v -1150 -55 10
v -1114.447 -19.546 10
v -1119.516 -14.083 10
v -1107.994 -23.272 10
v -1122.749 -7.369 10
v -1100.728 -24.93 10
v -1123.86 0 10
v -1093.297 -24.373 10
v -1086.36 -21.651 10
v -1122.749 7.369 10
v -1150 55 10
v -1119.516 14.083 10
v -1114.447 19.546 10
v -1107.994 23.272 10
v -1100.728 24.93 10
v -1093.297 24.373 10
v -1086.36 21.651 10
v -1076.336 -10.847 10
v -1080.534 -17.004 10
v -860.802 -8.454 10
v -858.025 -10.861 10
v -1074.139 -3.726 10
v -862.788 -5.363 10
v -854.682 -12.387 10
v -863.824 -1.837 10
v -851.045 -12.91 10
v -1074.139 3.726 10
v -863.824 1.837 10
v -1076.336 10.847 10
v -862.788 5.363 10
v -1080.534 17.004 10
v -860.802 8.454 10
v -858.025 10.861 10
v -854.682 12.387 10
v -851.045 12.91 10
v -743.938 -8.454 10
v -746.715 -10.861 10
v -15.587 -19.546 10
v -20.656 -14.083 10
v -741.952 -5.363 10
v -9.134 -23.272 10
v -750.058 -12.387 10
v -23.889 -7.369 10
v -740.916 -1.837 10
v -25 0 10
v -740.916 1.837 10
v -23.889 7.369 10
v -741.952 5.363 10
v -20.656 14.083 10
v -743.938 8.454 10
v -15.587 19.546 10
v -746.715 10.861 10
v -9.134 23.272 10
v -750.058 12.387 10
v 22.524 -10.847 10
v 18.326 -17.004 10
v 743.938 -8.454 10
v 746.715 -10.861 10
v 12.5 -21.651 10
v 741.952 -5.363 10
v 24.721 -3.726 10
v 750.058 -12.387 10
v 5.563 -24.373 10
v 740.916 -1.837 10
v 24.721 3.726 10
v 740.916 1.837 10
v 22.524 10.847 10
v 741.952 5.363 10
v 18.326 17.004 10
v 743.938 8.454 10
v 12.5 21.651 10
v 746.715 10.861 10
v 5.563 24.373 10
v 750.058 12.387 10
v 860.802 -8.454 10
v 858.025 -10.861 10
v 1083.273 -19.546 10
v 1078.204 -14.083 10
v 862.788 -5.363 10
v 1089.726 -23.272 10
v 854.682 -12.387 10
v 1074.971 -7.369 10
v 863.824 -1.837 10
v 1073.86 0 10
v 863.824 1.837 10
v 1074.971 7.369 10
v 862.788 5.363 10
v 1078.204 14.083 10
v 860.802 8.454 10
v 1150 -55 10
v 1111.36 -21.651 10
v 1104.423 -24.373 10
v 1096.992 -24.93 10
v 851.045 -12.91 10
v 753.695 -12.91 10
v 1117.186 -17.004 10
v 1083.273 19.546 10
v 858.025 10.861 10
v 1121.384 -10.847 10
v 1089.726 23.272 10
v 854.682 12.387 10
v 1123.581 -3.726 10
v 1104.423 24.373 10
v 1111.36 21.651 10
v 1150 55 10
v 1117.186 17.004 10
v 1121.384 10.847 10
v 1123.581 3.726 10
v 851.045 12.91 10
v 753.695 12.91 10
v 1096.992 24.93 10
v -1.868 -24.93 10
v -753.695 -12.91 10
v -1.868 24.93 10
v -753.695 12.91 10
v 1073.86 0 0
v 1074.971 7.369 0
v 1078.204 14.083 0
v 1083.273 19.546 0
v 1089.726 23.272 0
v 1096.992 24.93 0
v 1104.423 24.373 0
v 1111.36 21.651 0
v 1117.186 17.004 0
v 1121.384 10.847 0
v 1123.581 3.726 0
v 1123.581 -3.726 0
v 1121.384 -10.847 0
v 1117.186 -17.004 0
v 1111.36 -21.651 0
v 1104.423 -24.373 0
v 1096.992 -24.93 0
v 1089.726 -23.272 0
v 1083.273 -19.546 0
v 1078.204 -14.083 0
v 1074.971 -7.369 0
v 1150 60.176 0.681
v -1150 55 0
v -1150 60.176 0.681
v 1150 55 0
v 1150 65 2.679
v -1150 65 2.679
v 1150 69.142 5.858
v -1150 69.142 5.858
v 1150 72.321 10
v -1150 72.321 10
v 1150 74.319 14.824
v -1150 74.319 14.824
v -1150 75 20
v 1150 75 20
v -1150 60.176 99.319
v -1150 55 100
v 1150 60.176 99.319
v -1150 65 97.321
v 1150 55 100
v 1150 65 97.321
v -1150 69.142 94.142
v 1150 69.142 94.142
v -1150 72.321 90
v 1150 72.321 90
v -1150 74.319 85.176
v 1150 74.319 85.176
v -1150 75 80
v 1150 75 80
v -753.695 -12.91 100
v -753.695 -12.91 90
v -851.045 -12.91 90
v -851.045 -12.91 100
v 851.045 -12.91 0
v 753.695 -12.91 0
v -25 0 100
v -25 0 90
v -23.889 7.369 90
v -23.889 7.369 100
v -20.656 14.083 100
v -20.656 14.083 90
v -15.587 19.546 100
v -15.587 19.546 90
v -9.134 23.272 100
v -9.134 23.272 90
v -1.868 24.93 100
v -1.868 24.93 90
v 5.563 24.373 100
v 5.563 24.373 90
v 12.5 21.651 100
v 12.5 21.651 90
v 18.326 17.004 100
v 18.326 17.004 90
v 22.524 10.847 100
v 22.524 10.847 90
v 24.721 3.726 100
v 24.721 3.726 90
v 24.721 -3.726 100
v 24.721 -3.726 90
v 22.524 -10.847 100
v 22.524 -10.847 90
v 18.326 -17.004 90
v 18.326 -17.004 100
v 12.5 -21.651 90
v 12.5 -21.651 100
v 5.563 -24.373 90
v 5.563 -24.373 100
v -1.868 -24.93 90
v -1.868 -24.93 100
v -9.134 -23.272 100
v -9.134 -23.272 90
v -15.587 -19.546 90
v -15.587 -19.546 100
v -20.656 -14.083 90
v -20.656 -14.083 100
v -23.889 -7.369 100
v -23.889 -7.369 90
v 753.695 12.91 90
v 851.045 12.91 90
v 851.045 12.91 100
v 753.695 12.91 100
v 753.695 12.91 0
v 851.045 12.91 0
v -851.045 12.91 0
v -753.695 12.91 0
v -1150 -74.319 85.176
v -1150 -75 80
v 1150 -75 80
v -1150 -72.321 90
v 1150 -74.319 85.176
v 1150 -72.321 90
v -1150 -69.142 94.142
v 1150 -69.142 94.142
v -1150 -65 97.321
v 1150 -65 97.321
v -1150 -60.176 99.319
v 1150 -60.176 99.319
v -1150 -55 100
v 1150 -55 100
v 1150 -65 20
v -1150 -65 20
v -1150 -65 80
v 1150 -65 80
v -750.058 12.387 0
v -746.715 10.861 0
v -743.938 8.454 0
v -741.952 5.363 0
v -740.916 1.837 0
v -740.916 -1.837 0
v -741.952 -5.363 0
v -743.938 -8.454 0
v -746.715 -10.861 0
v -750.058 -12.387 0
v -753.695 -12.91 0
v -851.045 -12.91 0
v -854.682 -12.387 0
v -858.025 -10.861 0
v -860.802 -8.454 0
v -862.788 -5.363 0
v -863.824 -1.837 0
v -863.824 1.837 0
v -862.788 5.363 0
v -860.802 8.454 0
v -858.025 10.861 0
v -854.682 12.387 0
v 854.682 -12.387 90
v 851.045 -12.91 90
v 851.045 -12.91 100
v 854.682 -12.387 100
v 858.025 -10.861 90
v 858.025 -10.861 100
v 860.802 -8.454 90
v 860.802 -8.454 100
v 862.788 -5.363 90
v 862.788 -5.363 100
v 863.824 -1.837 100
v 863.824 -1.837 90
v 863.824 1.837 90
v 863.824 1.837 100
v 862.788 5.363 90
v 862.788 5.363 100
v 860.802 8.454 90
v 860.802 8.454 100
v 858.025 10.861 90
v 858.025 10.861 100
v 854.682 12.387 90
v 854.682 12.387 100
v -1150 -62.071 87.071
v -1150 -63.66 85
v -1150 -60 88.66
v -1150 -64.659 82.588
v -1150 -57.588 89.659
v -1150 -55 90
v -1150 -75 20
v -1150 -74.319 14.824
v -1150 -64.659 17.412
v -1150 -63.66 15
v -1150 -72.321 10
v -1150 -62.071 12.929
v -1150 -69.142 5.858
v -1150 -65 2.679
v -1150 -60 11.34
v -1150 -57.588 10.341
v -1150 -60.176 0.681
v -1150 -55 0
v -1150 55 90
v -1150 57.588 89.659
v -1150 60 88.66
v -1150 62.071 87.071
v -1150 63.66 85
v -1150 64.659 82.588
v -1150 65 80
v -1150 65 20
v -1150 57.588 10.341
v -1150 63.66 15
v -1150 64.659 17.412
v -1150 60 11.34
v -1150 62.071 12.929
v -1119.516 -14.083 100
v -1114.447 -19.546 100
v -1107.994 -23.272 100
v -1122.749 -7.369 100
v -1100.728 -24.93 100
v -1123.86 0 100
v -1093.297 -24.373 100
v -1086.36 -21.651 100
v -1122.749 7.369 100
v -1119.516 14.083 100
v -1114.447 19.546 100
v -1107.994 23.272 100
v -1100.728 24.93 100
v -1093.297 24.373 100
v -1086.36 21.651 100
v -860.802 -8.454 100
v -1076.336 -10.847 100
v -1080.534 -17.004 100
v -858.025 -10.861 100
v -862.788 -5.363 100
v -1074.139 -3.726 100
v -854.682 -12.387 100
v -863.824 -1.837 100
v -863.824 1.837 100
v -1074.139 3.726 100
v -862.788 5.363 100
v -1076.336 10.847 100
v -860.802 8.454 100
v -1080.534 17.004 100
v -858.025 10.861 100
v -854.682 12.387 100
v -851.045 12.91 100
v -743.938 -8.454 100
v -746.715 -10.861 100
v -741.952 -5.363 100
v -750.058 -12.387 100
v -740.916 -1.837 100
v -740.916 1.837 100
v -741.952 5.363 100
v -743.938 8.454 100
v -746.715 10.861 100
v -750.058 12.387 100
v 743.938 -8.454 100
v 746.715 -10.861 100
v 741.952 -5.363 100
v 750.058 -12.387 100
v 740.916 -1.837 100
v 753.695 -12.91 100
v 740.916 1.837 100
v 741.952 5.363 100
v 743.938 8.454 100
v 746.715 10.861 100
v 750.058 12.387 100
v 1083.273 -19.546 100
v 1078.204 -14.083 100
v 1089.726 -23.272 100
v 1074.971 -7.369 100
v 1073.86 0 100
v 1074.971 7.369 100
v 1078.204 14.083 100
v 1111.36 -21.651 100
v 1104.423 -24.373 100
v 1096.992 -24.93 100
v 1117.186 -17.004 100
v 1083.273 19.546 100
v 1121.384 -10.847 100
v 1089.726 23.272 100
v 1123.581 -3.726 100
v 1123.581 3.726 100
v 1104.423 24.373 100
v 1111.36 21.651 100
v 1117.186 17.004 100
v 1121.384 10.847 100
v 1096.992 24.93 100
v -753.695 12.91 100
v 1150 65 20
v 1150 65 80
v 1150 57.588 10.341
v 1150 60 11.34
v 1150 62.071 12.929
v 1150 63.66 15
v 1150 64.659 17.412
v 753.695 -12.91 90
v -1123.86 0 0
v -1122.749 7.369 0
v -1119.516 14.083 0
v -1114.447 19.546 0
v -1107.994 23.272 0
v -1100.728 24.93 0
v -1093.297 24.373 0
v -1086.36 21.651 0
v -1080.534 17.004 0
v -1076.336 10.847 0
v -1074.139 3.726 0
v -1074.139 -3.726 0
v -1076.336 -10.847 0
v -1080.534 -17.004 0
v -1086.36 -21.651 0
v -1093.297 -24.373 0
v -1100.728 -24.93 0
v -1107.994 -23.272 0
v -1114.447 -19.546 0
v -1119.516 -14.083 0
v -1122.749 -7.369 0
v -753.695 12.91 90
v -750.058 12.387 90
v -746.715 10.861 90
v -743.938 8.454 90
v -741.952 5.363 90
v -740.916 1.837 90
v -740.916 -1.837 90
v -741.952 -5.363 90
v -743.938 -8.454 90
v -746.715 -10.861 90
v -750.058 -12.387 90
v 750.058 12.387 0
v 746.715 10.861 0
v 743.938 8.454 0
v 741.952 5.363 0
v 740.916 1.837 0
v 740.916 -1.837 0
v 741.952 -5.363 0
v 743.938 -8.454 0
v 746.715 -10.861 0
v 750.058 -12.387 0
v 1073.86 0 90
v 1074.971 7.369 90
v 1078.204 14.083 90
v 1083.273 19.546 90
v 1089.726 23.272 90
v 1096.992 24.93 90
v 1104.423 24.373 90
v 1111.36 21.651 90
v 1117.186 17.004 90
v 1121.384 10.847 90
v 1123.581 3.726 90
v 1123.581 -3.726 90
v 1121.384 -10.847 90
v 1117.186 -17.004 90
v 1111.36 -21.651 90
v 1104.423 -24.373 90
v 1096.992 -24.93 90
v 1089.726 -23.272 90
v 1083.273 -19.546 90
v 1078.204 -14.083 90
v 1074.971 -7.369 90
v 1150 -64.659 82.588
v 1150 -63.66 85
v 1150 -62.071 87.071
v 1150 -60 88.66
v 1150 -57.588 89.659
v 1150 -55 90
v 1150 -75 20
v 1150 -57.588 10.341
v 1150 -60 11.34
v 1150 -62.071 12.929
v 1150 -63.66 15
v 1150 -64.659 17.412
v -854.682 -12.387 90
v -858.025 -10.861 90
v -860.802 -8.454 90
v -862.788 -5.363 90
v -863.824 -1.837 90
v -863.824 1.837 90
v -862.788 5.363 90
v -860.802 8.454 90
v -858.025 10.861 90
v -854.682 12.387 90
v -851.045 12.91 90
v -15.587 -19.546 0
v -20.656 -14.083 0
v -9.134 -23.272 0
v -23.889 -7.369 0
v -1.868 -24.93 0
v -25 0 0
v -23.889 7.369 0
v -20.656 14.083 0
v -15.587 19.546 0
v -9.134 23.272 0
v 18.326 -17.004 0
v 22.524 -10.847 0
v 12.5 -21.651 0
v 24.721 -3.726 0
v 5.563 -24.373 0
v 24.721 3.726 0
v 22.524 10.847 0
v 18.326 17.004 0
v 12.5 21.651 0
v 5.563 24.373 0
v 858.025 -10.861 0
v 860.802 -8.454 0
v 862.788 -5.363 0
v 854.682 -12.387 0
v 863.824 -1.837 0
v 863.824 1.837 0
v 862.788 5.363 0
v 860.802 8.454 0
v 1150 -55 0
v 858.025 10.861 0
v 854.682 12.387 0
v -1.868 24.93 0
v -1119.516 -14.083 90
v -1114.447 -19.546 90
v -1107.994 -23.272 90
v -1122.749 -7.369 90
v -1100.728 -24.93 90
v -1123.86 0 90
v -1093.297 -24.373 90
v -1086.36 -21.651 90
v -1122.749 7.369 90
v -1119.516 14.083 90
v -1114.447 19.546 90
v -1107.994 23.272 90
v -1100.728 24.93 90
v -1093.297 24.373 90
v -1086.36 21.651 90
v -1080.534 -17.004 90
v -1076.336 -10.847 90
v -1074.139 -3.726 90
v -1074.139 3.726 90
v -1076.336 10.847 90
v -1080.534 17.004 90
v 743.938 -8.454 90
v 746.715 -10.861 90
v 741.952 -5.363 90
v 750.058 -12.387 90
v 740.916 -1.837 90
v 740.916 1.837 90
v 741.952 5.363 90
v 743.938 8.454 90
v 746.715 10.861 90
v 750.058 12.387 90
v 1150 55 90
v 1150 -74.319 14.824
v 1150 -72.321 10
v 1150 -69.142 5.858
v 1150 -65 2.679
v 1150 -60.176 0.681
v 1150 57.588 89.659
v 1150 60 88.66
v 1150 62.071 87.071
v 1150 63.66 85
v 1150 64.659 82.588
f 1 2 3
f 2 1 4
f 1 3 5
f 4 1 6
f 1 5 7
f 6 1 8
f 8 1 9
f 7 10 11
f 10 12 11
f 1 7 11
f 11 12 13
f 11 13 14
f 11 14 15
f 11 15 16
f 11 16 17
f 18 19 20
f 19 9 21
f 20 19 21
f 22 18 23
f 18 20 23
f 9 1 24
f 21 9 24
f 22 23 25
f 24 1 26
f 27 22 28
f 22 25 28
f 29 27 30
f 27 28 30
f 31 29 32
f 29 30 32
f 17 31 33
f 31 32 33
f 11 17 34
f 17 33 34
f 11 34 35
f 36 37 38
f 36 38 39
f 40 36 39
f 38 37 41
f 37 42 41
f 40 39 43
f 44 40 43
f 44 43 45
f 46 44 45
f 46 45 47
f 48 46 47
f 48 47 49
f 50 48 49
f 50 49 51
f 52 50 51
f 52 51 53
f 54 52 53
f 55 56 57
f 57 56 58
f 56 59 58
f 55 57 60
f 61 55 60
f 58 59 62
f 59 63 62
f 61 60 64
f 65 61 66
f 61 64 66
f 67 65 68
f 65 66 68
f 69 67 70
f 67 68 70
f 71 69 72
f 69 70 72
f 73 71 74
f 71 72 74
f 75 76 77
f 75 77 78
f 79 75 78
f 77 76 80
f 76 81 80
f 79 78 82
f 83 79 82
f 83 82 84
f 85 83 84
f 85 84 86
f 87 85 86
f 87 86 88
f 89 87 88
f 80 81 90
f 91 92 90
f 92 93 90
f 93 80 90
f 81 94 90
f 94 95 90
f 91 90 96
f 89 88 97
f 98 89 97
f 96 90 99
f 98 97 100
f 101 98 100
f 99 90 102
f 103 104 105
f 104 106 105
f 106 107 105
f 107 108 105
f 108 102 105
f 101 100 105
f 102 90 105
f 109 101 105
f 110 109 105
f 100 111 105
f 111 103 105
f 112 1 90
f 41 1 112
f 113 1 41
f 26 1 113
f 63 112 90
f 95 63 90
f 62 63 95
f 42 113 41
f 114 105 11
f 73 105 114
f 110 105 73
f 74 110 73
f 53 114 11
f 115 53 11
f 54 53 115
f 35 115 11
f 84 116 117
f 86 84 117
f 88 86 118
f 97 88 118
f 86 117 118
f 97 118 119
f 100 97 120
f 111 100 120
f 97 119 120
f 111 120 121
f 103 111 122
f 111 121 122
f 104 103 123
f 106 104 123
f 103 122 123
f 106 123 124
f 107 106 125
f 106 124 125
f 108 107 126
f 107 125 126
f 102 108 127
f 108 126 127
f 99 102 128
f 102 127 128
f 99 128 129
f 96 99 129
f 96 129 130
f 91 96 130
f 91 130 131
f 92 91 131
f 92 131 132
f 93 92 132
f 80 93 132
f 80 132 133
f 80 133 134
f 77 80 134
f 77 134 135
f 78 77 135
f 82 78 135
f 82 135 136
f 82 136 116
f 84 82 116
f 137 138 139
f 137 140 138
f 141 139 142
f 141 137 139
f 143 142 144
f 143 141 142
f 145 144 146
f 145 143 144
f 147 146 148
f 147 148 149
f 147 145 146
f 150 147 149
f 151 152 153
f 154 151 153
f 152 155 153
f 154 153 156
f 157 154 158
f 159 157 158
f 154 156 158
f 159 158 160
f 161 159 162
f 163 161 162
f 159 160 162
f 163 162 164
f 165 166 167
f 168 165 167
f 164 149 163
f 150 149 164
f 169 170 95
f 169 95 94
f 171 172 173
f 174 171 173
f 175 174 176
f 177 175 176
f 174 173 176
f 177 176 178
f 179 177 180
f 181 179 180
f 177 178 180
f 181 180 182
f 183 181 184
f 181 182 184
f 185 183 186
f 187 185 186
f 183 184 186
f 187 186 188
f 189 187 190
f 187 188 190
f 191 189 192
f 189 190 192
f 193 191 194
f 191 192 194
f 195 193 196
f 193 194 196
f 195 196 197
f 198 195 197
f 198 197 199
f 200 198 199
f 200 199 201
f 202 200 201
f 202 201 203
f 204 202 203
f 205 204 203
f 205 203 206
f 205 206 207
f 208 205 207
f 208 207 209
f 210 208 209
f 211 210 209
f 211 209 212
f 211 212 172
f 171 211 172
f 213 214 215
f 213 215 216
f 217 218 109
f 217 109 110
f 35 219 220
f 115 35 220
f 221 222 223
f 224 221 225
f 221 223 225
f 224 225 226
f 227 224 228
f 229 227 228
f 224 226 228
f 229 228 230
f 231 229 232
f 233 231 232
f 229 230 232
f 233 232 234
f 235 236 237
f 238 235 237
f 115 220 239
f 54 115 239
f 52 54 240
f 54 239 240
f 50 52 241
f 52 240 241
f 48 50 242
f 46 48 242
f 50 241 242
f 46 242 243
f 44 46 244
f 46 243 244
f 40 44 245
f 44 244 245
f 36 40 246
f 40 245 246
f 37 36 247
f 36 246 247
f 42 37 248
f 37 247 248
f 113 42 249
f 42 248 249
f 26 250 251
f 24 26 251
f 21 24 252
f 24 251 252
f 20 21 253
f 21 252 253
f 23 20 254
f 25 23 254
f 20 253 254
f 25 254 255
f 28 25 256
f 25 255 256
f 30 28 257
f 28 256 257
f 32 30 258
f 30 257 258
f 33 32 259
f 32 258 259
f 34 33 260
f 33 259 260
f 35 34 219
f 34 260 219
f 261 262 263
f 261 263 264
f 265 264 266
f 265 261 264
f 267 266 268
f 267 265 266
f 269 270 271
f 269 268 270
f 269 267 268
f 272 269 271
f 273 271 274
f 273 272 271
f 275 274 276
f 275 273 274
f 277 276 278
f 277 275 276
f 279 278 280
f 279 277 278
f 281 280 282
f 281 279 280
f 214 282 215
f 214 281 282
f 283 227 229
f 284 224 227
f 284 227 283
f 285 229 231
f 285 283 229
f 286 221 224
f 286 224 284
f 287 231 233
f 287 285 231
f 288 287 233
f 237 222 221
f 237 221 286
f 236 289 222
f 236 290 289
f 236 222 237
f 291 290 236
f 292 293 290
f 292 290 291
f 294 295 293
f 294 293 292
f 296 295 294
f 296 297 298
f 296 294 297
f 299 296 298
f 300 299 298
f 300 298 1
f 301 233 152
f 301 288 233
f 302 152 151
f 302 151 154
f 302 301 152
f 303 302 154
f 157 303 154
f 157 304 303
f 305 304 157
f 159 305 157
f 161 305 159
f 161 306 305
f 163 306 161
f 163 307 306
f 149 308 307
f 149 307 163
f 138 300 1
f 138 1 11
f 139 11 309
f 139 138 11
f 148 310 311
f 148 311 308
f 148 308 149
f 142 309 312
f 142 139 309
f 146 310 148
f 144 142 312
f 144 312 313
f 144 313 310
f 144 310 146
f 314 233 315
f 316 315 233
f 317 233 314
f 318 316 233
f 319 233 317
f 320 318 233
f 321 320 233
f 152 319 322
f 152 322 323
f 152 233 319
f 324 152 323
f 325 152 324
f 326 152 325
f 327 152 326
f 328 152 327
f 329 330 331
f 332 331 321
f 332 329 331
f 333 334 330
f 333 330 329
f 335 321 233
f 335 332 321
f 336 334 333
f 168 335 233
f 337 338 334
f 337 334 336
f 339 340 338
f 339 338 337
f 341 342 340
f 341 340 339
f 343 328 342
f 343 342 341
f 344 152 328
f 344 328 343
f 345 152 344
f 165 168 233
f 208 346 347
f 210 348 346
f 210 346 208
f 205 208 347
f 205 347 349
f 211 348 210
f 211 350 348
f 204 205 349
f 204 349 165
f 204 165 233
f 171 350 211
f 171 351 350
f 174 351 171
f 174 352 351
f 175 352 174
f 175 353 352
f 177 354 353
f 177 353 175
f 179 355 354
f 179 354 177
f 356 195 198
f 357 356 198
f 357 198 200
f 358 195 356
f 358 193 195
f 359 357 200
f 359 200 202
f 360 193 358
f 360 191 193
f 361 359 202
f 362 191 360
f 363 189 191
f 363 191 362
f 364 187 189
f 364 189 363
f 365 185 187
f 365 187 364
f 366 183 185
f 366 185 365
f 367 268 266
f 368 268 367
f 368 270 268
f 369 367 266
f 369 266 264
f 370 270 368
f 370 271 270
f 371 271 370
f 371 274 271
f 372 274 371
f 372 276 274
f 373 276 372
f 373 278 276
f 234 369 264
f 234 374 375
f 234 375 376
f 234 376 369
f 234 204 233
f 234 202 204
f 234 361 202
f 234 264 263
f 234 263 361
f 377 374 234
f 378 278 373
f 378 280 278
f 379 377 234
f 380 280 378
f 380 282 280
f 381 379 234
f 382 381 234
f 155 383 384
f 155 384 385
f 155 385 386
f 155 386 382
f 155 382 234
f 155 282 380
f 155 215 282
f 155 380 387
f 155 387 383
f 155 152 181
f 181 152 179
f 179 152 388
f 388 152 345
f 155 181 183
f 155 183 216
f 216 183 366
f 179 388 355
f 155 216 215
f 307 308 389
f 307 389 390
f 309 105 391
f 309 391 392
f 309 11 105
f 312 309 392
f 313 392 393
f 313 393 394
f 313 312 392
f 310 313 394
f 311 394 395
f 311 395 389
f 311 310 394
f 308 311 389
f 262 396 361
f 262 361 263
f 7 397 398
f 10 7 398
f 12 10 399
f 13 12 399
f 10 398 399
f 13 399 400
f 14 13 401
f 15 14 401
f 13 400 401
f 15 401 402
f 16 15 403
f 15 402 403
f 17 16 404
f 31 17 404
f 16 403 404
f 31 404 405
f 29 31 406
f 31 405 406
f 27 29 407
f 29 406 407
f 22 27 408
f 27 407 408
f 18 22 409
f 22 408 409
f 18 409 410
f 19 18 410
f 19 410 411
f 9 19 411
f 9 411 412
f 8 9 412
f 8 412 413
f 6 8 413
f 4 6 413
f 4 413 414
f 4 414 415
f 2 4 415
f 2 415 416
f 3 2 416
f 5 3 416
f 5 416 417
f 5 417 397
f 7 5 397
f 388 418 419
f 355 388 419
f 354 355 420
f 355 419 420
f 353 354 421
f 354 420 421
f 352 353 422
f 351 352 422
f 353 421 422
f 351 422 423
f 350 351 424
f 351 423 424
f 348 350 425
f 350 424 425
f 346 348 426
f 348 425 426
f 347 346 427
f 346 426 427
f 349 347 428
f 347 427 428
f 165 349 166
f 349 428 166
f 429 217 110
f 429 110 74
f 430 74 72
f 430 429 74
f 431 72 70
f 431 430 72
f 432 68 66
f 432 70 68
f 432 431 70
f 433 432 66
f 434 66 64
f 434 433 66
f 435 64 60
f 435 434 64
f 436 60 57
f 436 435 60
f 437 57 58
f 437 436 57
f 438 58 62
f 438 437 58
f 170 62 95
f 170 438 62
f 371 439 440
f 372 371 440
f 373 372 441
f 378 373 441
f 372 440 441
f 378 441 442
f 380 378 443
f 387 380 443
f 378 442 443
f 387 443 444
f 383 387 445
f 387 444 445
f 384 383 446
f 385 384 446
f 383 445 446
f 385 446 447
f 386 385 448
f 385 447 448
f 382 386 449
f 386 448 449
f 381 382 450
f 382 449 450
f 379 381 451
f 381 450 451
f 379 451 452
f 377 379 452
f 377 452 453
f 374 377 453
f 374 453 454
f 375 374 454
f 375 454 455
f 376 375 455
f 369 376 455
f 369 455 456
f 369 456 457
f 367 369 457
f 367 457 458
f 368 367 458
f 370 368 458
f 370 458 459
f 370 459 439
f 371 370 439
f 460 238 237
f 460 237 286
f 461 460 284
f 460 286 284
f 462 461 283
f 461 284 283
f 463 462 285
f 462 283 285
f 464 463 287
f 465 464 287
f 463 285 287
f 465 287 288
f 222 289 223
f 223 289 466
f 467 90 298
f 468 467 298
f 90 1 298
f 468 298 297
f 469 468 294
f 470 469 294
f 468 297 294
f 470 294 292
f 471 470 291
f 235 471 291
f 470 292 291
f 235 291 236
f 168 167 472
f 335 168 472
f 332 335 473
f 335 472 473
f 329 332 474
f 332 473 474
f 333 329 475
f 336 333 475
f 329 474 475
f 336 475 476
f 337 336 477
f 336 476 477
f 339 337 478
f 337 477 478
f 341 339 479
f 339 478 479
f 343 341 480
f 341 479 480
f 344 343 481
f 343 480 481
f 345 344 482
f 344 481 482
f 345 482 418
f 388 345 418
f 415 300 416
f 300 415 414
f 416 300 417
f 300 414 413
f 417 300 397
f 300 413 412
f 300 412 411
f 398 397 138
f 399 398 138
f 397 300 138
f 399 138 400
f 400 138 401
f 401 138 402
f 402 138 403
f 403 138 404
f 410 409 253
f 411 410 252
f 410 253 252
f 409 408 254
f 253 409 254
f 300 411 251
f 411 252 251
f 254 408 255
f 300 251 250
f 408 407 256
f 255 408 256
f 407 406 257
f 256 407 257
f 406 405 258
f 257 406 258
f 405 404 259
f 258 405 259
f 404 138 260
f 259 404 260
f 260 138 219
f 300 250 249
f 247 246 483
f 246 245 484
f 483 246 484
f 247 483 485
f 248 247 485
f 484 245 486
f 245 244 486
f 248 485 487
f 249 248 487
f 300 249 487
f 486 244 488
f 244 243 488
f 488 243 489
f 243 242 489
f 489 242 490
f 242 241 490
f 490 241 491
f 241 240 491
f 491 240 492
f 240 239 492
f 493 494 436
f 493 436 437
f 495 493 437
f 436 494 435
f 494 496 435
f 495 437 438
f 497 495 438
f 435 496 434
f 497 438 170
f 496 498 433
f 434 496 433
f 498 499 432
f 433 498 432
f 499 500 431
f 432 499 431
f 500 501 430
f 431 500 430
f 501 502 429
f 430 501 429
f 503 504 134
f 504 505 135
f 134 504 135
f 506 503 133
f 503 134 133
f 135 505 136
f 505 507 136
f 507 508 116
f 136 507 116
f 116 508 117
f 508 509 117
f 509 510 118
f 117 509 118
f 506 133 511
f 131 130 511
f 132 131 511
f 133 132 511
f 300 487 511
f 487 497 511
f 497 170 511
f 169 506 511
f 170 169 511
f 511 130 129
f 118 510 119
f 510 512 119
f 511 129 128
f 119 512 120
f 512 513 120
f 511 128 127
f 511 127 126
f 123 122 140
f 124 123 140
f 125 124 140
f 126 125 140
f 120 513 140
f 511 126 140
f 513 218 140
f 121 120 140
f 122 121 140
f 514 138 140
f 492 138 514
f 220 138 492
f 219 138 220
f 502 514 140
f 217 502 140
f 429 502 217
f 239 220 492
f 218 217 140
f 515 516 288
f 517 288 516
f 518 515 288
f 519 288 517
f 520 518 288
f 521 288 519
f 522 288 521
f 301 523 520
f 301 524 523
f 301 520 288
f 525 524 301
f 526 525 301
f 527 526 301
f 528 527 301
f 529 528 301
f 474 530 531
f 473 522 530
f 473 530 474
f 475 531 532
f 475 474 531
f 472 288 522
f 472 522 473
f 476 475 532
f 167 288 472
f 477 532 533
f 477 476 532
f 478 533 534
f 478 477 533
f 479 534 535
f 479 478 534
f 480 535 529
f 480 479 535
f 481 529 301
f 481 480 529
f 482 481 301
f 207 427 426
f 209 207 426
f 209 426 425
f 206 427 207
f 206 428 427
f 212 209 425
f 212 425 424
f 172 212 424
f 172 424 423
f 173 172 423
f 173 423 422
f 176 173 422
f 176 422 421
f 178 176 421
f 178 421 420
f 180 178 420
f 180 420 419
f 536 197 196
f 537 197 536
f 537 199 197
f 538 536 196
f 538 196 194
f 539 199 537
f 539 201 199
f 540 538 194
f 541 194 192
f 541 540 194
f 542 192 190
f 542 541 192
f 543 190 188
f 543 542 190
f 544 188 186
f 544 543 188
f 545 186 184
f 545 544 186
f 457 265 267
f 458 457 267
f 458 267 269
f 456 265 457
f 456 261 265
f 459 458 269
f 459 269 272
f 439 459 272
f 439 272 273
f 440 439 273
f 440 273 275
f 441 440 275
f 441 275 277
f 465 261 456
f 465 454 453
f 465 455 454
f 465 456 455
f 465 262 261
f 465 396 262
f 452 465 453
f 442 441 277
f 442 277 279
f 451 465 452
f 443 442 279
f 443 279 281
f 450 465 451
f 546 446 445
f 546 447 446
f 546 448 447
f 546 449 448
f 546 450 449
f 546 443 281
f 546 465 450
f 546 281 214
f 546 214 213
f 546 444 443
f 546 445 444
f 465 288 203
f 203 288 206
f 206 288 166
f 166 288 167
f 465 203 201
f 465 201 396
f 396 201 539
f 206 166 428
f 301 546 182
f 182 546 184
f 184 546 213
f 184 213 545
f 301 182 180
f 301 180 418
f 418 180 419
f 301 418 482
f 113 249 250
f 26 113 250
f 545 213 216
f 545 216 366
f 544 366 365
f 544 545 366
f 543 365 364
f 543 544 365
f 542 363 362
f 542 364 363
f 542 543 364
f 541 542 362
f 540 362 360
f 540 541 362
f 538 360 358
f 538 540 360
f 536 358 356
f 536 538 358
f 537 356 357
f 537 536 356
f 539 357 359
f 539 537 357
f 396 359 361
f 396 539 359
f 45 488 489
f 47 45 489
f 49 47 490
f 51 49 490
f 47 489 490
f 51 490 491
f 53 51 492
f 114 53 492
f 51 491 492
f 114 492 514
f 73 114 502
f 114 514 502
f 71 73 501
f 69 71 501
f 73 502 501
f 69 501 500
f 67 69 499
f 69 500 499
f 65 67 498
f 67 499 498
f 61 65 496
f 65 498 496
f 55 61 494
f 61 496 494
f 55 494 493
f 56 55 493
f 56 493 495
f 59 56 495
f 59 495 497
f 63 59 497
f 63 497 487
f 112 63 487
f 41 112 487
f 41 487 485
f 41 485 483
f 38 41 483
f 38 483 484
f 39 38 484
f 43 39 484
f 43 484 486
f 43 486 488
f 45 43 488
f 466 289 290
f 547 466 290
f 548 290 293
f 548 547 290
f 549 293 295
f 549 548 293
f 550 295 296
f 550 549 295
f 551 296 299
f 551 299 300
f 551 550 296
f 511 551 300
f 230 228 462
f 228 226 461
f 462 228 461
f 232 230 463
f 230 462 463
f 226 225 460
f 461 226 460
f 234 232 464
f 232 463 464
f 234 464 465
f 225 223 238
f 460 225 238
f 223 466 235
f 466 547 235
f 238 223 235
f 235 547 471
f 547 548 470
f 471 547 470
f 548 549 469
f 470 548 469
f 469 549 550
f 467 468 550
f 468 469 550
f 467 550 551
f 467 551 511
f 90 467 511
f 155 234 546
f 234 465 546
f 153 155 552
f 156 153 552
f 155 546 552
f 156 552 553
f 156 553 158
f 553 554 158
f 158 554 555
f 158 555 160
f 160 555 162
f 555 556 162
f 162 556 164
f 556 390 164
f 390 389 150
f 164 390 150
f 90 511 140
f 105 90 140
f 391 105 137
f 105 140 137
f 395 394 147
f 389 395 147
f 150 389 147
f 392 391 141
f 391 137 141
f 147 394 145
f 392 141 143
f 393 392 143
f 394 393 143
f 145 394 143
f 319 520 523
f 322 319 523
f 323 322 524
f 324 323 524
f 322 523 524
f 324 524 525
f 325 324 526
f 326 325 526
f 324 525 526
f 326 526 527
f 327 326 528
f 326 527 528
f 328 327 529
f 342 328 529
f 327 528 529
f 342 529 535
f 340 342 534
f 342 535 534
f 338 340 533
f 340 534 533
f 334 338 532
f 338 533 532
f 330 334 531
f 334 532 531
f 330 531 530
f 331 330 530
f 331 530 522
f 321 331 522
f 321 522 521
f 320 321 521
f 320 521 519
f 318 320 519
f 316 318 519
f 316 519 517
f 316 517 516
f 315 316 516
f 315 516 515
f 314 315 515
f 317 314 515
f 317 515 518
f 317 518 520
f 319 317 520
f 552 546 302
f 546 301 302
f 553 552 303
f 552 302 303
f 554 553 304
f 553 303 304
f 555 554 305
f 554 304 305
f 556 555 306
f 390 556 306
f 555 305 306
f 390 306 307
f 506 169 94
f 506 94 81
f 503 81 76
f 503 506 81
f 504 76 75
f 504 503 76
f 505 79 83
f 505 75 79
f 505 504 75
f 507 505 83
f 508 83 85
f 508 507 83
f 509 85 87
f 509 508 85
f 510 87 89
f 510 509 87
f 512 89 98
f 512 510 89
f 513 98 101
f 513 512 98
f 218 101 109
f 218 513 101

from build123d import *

# Parameters (mm, degrees)
SKETCH1_W               = 2300
SKETCH1_H               = 150
BOSS_EXTRUDE1_DEPTH     = 100
CUT_EXTRUDE1_DEPTH      = 2304.394234602
CUT_EXTRUDE1_DEPTH_BACK = 2304.394234602
SKETCH3_W               = 80
SKETCH3_H               = 130
FILLET1_R               = 10
FILLET2_R               = 20
SKETCH4_R               = 25
CUT_EXTRUDE2_DEPTH      = 1157.773530126
CUT_EXTRUDE3_DEPTH      = 1157.773530126


with BuildPart() as part:
    # Sketch1 → Boss-Extrude1 (new body)
    with BuildSketch(Plane.XY):
        Rectangle(SKETCH1_W, SKETCH1_H)
    extrude(amount=BOSS_EXTRUDE1_DEPTH)

    # Sketch3 → Cut-Extrude1 (cut, two sides: drawn at the far end of the back side and taken through both)
    with BuildSketch(Plane.ZY.offset(1150).offset(-CUT_EXTRUDE1_DEPTH_BACK)):
        with Locations((50, 0)):
            Rectangle(SKETCH3_W, SKETCH3_H)
    extrude(amount=CUT_EXTRUDE1_DEPTH + CUT_EXTRUDE1_DEPTH_BACK, mode=Mode.SUBTRACT)

    # Fillet1
    fillet1_edges = [part.edges().sort_by_distance(p)[0] for p in [
        (0, -65, 90),
        (0, -65, 10),
        (0, 65, 10),
        (0, 65, 90),
    ]]
    fillet(fillet1_edges, radius=FILLET1_R)

    # Fillet2
    fillet2_edges = [part.edges().sort_by_distance(p)[0] for p in [
        (0, 75, 100),
        (0, 75, 0),
        (0, -75, 0),
        (0, -75, 100),
    ]]
    fillet(fillet2_edges, radius=FILLET2_R)

    # Sketch4 → Cut-Extrude2 (cut, through all)
    with BuildSketch(Plane(origin=(0, 0, 0), x_dir=(-1, 0, 0), z_dir=(0, 0, -1))):
        Circle(SKETCH4_R)
        with Locations((-1098.86, 0)):
            Circle(SKETCH4_R)
        with Locations((1098.86, 0)):
            Circle(SKETCH4_R)
    extrude(amount=-CUT_EXTRUDE2_DEPTH, mode=Mode.SUBTRACT)

    # Sketch5 → Cut-Extrude3 (cut, through all)
    with BuildSketch(Plane(origin=(0, 0, 0), x_dir=(-1, 0, 0), z_dir=(0, 0, -1))):
        with BuildLine():
            Line((-851.045, 12.91), (-753.695, 12.91))
            ThreePointArc((-753.695, 12.91), (-740.785, 0), (-753.695, -12.91))
            Line((-753.695, -12.91), (-851.045, -12.91))
            ThreePointArc((-851.045, -12.91), (-863.955, 0), (-851.045, 12.91))
        make_face()
        with BuildLine():
            Line((851.045, 12.91), (753.695, 12.91))
            ThreePointArc((753.695, 12.91), (740.785, 0), (753.695, -12.91))
            Line((753.695, -12.91), (851.045, -12.91))
            ThreePointArc((851.045, -12.91), (863.955, 0), (851.045, 12.91))
        make_face()
    extrude(amount=-CUT_EXTRUDE3_DEPTH, mode=Mode.SUBTRACT)


solid = part.part
